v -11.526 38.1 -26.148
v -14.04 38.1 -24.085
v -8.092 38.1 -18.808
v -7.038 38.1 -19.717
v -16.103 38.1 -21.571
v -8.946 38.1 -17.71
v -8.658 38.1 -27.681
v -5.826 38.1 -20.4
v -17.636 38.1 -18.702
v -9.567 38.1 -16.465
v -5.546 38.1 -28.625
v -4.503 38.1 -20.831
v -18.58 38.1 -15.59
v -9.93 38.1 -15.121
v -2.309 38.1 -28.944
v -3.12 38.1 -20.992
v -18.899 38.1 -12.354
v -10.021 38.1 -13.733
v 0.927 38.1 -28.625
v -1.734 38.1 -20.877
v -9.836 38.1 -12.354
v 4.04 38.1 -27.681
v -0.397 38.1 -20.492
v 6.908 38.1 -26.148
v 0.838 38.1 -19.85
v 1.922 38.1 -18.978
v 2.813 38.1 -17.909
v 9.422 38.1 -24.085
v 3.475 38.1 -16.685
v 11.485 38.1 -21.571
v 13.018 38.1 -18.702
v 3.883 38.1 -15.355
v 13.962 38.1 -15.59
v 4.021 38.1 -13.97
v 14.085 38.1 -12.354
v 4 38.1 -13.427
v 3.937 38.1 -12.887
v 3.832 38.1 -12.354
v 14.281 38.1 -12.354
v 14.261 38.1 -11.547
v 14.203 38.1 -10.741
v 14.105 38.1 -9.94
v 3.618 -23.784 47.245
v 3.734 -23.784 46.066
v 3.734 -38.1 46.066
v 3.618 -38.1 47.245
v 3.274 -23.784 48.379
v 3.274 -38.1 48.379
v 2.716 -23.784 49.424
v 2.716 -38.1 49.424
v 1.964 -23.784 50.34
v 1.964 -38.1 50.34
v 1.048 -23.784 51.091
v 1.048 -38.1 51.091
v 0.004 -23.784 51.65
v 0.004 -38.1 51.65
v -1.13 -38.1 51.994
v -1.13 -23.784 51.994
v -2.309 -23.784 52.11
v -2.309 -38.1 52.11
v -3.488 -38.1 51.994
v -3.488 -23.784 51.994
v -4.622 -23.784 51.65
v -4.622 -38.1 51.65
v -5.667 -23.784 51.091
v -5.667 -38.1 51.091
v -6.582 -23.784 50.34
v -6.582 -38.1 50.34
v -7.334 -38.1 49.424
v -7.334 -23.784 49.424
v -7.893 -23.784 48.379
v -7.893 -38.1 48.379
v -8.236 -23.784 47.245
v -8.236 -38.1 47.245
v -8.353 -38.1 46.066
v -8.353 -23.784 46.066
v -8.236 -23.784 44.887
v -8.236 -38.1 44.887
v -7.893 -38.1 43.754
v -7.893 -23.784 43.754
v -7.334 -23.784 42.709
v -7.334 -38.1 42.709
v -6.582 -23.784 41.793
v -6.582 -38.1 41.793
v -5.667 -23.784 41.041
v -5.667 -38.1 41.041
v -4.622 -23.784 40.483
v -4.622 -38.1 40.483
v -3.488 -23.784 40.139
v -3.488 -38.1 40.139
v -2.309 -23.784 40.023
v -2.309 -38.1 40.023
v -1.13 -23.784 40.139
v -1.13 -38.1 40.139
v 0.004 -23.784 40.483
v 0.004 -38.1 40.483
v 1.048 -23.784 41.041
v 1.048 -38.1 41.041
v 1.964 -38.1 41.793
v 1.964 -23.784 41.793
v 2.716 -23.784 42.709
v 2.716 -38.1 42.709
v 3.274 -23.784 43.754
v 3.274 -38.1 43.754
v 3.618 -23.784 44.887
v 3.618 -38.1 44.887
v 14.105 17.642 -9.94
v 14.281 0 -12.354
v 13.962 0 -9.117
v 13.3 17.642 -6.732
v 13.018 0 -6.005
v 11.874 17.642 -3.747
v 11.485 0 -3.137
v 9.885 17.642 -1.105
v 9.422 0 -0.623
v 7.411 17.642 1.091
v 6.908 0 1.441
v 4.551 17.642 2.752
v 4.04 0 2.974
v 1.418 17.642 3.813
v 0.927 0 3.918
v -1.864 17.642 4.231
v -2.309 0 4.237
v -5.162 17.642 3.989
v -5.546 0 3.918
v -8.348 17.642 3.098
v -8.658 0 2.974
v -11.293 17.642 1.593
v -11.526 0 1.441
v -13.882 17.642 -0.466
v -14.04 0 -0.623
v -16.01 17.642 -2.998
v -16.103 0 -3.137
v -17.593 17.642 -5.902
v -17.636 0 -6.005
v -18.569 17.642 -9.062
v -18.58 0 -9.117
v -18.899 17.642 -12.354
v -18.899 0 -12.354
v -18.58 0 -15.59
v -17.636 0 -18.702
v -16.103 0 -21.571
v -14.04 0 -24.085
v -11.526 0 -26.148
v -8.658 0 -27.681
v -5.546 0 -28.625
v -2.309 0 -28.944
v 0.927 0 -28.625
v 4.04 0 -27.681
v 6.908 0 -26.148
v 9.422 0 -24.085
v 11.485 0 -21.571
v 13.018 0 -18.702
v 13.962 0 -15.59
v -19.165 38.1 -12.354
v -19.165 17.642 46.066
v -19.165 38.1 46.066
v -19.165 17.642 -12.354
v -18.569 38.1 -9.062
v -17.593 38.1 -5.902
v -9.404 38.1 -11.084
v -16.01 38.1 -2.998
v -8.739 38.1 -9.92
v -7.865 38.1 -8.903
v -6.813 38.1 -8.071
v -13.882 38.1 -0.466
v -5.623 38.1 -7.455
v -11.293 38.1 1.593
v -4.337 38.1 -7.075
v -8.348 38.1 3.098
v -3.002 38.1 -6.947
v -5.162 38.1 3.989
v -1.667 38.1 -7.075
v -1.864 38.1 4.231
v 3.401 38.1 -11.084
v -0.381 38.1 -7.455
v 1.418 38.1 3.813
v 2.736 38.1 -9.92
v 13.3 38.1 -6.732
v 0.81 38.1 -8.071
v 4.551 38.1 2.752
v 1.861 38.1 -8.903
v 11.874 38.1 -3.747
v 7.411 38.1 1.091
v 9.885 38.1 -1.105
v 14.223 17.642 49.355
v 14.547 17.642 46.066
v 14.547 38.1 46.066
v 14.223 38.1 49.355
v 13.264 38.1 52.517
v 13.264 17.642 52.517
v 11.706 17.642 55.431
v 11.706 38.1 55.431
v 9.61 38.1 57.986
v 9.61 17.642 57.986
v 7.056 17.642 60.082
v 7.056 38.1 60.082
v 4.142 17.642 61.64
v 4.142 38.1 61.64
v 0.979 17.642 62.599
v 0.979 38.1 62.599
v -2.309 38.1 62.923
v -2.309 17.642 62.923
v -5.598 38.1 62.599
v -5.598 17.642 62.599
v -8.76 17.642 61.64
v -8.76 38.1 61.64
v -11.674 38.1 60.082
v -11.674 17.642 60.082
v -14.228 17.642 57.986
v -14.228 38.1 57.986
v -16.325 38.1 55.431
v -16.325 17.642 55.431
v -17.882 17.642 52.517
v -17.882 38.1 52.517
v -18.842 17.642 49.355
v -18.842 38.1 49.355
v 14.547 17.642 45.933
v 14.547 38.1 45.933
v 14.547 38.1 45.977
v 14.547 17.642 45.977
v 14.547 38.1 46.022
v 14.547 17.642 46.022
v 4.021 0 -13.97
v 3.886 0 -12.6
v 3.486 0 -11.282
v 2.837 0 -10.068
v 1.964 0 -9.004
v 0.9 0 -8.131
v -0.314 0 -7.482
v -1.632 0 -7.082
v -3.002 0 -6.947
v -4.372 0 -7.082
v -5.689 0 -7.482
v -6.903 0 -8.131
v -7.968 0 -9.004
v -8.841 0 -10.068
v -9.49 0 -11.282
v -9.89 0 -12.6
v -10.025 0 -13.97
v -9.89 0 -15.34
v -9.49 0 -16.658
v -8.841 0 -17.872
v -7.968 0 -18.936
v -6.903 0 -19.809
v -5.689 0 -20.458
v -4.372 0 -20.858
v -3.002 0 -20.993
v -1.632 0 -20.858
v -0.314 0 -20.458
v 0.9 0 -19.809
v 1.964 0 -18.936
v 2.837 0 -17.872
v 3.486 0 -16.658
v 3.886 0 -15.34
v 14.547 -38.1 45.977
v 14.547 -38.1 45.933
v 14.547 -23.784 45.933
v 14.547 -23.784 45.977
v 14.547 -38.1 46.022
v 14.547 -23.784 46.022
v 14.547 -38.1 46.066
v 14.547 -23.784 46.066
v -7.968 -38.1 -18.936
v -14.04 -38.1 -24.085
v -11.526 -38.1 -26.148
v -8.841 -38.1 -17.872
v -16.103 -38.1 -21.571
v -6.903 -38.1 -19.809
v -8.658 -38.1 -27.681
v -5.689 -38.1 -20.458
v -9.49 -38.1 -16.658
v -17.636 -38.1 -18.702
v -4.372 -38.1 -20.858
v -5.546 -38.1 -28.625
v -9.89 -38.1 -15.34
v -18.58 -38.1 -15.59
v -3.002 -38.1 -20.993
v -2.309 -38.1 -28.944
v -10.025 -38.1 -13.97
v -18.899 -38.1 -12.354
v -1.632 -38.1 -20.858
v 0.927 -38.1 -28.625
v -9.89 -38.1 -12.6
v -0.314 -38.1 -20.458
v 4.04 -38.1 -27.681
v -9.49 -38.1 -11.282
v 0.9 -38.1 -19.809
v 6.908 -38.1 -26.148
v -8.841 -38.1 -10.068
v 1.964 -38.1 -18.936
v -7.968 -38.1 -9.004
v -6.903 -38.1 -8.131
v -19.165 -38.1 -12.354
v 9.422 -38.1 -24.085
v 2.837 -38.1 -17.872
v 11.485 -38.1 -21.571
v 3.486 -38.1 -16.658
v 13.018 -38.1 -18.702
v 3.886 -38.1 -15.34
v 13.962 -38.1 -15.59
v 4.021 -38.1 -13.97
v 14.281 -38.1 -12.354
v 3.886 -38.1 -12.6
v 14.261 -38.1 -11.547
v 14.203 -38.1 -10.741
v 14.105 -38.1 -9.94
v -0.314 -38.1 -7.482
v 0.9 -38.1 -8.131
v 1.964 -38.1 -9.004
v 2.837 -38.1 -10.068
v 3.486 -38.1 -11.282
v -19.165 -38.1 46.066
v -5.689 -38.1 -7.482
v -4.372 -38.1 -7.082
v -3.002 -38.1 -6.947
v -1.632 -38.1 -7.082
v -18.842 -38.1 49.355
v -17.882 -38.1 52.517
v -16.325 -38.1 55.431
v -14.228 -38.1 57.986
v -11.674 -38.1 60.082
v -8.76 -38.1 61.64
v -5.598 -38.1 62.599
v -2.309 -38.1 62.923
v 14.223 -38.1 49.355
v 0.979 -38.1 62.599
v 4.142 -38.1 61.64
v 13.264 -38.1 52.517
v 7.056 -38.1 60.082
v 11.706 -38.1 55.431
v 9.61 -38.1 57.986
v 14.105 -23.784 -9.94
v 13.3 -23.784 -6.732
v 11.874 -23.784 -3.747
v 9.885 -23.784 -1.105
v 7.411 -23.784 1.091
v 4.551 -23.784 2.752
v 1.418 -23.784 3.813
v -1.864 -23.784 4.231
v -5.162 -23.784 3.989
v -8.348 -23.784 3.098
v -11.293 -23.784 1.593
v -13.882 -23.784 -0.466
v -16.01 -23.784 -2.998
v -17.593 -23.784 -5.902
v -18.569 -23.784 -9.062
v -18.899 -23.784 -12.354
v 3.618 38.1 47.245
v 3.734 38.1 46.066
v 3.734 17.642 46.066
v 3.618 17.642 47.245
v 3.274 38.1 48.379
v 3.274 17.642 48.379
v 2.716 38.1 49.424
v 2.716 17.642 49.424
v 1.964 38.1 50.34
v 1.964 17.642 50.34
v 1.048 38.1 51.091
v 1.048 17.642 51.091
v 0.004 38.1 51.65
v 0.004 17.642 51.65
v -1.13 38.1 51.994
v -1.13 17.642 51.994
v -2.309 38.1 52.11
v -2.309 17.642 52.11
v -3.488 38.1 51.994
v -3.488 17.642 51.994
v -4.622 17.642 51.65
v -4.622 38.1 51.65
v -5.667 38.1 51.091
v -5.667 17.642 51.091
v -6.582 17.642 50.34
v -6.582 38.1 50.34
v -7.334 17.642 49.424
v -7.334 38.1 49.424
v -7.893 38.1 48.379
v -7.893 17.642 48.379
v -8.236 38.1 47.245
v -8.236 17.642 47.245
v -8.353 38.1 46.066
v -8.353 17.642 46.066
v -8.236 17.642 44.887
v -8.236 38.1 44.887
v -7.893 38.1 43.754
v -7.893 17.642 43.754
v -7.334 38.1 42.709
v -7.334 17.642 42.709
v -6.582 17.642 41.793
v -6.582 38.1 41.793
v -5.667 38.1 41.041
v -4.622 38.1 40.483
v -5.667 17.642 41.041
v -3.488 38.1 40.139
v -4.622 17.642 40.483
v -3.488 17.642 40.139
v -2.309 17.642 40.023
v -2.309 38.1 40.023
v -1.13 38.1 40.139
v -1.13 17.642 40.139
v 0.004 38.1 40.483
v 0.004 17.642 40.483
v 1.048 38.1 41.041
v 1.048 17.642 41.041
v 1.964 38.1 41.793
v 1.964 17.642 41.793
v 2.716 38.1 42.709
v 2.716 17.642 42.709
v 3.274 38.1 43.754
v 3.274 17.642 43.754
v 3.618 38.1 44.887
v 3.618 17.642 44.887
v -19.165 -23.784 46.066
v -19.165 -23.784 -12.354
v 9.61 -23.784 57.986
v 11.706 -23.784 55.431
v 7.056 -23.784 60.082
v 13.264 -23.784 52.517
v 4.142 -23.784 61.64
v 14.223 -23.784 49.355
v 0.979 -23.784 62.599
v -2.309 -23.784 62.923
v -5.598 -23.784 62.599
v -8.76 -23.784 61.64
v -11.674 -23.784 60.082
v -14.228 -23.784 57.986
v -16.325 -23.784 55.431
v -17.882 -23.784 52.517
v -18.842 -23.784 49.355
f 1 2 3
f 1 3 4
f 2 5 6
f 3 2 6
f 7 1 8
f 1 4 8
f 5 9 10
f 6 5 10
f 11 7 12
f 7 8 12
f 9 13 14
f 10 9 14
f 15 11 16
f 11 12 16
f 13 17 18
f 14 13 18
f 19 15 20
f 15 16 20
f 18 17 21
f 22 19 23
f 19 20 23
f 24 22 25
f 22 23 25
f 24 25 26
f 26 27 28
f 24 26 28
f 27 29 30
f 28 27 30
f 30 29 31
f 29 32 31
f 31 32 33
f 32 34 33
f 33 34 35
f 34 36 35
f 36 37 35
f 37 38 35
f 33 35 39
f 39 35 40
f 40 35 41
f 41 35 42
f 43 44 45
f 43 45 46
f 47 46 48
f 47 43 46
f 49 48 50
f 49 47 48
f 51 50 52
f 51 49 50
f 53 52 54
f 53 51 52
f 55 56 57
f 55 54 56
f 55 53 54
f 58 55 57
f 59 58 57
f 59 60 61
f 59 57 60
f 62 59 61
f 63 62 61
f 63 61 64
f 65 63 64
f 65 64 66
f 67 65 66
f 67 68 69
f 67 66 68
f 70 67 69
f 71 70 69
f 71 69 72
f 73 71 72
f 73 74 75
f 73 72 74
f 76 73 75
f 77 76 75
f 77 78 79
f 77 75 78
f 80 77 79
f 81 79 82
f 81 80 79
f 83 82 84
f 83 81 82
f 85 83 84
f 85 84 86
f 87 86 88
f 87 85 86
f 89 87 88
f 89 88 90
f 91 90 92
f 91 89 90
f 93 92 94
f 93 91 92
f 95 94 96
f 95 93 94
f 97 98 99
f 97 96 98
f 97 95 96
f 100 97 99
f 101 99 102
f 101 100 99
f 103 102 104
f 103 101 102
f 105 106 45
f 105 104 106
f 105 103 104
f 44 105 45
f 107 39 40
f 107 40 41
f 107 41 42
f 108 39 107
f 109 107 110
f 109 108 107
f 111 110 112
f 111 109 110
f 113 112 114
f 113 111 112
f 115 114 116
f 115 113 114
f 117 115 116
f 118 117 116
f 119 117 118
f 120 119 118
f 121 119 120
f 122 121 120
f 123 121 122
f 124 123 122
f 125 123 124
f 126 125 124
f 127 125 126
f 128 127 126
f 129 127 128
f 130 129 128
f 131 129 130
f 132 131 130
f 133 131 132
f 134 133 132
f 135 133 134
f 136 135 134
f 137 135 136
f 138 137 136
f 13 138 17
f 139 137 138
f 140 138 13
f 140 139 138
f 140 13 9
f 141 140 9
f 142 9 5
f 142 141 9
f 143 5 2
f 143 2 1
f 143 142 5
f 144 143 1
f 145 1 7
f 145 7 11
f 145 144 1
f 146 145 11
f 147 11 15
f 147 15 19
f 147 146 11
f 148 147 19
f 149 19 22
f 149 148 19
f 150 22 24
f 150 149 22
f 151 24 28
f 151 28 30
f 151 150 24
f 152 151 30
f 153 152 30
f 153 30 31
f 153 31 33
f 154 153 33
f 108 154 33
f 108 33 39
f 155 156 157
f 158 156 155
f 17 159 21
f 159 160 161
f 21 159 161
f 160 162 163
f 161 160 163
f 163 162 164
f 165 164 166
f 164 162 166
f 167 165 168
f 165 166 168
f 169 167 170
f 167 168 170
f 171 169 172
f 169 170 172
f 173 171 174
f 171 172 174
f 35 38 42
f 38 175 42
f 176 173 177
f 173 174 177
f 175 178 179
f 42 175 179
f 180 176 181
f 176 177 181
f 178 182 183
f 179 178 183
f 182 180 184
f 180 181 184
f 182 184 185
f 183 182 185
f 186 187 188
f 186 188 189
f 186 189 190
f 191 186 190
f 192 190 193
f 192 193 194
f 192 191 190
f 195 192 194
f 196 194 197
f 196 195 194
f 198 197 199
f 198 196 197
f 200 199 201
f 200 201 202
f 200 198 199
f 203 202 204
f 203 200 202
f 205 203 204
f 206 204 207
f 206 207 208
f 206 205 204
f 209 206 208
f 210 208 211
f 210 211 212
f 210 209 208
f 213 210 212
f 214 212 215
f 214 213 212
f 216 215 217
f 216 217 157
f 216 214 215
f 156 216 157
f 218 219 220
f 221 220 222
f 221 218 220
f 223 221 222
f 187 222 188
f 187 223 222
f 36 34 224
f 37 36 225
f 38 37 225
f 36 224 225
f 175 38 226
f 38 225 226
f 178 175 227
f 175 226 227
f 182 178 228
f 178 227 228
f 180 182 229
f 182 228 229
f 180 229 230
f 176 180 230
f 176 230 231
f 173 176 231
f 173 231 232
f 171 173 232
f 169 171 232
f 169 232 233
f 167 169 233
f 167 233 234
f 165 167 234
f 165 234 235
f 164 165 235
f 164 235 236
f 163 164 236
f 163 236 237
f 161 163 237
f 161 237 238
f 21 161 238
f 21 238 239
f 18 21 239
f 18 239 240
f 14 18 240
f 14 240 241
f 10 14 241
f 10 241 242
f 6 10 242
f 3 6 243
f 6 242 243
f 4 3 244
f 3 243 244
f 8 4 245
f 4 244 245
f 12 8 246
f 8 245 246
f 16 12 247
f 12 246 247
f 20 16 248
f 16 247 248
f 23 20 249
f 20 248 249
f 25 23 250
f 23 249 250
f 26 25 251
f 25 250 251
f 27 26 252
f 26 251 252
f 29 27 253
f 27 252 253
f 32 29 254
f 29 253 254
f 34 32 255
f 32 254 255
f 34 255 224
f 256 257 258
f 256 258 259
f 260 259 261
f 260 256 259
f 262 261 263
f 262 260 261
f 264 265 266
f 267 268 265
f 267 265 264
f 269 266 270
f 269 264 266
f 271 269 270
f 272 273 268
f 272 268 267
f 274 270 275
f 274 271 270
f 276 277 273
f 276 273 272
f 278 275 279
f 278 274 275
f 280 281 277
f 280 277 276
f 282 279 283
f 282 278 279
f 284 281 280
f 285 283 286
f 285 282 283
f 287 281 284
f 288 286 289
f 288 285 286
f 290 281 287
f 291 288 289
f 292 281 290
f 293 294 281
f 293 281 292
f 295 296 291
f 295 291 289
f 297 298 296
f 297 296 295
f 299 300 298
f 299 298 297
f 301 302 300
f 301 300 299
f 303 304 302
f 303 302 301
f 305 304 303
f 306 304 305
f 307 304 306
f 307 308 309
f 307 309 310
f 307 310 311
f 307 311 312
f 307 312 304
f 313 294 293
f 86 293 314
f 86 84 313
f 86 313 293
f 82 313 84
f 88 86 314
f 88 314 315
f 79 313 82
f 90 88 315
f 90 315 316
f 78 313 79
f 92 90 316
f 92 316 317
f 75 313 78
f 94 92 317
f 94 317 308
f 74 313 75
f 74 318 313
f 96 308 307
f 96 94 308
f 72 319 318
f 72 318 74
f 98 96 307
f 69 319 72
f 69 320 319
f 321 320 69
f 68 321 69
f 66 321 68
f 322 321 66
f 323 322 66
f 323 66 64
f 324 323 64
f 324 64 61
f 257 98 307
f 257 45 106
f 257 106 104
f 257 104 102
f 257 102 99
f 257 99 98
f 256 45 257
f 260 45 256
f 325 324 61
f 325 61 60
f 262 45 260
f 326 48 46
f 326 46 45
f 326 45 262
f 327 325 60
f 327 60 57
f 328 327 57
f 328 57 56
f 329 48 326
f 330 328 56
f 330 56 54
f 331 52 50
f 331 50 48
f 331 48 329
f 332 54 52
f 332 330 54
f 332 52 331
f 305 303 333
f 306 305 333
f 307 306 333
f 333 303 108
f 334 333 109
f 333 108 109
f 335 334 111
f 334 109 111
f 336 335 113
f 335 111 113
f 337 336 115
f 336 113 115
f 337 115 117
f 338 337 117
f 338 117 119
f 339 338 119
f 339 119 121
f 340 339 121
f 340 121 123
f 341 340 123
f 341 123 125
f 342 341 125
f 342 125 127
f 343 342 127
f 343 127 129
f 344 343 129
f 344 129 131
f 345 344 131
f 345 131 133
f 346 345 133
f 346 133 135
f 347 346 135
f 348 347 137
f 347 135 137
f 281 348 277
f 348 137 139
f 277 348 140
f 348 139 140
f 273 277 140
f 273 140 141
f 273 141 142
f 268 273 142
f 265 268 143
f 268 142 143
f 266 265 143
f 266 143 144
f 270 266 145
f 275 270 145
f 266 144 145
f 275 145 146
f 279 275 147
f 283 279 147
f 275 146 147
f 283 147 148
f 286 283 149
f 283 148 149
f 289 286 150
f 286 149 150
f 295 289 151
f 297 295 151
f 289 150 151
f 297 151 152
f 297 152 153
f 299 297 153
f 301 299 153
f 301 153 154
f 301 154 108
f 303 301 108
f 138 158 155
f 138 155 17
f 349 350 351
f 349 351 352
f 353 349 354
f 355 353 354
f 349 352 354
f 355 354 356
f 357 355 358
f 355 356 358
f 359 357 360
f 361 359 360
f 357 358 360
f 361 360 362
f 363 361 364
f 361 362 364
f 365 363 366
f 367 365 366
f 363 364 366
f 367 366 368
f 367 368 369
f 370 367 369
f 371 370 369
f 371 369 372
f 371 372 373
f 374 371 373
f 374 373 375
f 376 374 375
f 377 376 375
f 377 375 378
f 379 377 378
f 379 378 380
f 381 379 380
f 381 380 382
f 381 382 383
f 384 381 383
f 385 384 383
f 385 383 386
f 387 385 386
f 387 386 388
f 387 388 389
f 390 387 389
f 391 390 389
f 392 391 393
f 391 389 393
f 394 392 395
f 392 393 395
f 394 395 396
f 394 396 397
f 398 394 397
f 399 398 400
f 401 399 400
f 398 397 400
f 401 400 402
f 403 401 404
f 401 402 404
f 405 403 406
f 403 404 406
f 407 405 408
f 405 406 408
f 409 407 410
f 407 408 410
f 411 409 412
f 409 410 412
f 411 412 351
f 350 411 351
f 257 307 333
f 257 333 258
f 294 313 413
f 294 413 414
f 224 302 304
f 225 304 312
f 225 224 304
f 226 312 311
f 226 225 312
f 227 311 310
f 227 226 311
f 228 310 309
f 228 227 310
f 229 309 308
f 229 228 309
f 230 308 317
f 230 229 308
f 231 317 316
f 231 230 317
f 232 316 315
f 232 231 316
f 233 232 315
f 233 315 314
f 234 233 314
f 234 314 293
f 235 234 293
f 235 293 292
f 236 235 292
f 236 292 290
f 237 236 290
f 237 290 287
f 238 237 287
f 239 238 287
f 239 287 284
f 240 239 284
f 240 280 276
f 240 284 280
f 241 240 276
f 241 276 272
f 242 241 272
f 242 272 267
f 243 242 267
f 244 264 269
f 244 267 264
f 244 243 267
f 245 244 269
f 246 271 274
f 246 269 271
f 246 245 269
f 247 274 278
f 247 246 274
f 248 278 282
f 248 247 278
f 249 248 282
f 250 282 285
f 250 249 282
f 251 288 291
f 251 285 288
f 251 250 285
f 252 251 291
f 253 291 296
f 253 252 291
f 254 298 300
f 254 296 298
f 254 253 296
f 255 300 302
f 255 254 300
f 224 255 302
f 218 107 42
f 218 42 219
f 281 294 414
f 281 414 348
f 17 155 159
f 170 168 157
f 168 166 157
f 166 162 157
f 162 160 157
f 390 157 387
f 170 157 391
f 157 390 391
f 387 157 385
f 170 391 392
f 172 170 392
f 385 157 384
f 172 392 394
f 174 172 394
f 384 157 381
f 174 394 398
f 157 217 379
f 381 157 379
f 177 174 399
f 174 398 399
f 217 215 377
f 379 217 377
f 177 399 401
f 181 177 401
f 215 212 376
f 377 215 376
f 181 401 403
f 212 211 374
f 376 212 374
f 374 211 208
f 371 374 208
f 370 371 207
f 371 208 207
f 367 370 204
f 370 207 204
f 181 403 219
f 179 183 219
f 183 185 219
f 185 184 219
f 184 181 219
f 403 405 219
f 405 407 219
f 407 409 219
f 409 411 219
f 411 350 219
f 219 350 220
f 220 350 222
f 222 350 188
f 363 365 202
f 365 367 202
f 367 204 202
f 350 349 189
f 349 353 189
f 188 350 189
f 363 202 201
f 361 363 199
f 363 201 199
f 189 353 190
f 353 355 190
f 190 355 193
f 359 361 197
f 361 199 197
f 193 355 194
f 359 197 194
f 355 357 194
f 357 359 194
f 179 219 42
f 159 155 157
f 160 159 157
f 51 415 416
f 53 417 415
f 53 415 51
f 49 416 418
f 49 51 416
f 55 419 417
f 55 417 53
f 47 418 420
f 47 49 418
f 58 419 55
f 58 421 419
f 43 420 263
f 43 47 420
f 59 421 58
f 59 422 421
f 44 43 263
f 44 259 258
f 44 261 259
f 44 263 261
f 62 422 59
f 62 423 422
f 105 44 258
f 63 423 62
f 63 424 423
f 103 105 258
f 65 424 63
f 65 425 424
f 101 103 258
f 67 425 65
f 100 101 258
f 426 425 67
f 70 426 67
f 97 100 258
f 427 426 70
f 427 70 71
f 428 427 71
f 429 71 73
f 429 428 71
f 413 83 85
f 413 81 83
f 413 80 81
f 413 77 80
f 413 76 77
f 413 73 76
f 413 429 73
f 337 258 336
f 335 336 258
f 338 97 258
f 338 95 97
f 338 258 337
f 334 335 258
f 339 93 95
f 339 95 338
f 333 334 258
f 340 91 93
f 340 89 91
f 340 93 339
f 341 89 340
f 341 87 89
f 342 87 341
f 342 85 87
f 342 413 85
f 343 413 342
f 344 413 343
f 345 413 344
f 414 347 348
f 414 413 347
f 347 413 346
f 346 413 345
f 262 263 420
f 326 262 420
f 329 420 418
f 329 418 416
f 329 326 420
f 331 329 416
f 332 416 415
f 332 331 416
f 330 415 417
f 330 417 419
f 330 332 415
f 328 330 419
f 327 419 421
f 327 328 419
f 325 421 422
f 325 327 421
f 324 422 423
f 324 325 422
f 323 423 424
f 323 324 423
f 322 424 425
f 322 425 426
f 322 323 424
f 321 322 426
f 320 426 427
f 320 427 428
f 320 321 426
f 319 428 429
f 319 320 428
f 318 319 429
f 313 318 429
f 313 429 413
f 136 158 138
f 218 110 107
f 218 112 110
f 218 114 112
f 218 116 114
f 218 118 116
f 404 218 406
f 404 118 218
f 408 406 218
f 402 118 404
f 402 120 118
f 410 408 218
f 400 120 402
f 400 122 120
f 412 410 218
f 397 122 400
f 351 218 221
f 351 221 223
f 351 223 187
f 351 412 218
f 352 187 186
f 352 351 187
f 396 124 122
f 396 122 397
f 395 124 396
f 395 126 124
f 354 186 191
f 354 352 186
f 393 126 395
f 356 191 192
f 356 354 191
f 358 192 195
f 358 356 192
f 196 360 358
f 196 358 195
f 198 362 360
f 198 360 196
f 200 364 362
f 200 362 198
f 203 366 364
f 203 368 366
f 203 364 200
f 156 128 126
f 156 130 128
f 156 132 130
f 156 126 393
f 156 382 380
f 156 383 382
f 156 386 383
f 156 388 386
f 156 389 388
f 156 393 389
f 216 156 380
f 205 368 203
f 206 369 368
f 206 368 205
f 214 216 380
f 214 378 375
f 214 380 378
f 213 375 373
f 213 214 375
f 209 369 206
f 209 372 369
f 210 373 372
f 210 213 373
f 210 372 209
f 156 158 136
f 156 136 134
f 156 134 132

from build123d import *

# Parameters (mm, degrees)
F1_DEPTH      = 38.1
F1_DEPTH_BACK = 38.1
F3_DEPTH      = 19.1664542539
F3_DEPTH_BACK = 14.5482714754
F4_R          = 16.5901380348
F5_DEPTH      = 38.1
F5_DEPTH_BACK = 38.1
F6_R          = 6.0434661234
F6_R_2        = 7.0228239136
F7_DEPTH      = 38.101
F7_DEPTH_BACK = 38.1


with BuildPart() as f1:
    # F0 (on Front) → F1 (new body, two sides)
    with BuildSketch(Plane.XZ) as f1_sk:
        with BuildLine():
            ThreePointArc((14.5467436103, 45.9329626612), (14.5471395086, 45.9996620138), (14.5472714754, 46.0663624108))
            ThreePointArc((14.5472714754, 46.0663624108), (-2.3090913892, 62.9227252754), (-19.1654542538, 46.0663624108))
            ThreePointArc((-19.1654542538, 46.0663624108), (-2.3757917862, 29.210131513), (14.5467436103, 45.9329626612))
        make_face()
        with BuildLine():
            ThreePointArc((14.5467436103, 45.9329626612), (-2.3757917862, 29.210131513), (-19.1654542538, 46.0663624108))
            Line((-19.1654542538, 46.0663624108), (-19.1654542538, -12.3536363244))
            Line((-19.1654542538, -12.3536363244), (14.0854548663, -12.3536363244))
            Line((14.0854548663, -12.3536363244), (14.5467436103, 45.9329626612))
        make_face()
    extrude(amount=F1_DEPTH)
    extrude(f1_sk.sketch, amount=-F1_DEPTH_BACK)

    # F2 (on Right) → F3 (cut, two sides)
    with BuildSketch(Plane.YZ) as f3_sk:
        Polygon((17.6418442279, 67.0483036786), (-23.7836372107, 66.8481811881), (-23.7836372107, -12.9865873605), (17.6418442279, -12.9865873605), align=None)
    extrude(amount=-F3_DEPTH, mode=Mode.SUBTRACT)
    extrude(f3_sk.sketch, amount=F3_DEPTH_BACK, mode=Mode.SUBTRACT)

    # F4 (on Front) → F5 (join, two sides)
    with BuildSketch(Plane.XZ) as f5_sk:
        with Locations((-2.3090913892, -12.3536363244)):
            Circle(F4_R)
    extrude(amount=F5_DEPTH)
    extrude(f5_sk.sketch, amount=-F5_DEPTH_BACK)

    # F6 (on Front) → F7 (cut, two sides)
    with BuildSketch(Plane.XZ) as f7_sk:
        with Locations((-2.3090913892, 46.0663624108)):
            Circle(F6_R)
        with Locations((-3.0018182006, -13.9700006694)):
            Circle(F6_R_2)
    extrude(amount=F7_DEPTH, mode=Mode.SUBTRACT)
    extrude(f7_sk.sketch, amount=-F7_DEPTH_BACK, mode=Mode.SUBTRACT)


solid = f1.part
